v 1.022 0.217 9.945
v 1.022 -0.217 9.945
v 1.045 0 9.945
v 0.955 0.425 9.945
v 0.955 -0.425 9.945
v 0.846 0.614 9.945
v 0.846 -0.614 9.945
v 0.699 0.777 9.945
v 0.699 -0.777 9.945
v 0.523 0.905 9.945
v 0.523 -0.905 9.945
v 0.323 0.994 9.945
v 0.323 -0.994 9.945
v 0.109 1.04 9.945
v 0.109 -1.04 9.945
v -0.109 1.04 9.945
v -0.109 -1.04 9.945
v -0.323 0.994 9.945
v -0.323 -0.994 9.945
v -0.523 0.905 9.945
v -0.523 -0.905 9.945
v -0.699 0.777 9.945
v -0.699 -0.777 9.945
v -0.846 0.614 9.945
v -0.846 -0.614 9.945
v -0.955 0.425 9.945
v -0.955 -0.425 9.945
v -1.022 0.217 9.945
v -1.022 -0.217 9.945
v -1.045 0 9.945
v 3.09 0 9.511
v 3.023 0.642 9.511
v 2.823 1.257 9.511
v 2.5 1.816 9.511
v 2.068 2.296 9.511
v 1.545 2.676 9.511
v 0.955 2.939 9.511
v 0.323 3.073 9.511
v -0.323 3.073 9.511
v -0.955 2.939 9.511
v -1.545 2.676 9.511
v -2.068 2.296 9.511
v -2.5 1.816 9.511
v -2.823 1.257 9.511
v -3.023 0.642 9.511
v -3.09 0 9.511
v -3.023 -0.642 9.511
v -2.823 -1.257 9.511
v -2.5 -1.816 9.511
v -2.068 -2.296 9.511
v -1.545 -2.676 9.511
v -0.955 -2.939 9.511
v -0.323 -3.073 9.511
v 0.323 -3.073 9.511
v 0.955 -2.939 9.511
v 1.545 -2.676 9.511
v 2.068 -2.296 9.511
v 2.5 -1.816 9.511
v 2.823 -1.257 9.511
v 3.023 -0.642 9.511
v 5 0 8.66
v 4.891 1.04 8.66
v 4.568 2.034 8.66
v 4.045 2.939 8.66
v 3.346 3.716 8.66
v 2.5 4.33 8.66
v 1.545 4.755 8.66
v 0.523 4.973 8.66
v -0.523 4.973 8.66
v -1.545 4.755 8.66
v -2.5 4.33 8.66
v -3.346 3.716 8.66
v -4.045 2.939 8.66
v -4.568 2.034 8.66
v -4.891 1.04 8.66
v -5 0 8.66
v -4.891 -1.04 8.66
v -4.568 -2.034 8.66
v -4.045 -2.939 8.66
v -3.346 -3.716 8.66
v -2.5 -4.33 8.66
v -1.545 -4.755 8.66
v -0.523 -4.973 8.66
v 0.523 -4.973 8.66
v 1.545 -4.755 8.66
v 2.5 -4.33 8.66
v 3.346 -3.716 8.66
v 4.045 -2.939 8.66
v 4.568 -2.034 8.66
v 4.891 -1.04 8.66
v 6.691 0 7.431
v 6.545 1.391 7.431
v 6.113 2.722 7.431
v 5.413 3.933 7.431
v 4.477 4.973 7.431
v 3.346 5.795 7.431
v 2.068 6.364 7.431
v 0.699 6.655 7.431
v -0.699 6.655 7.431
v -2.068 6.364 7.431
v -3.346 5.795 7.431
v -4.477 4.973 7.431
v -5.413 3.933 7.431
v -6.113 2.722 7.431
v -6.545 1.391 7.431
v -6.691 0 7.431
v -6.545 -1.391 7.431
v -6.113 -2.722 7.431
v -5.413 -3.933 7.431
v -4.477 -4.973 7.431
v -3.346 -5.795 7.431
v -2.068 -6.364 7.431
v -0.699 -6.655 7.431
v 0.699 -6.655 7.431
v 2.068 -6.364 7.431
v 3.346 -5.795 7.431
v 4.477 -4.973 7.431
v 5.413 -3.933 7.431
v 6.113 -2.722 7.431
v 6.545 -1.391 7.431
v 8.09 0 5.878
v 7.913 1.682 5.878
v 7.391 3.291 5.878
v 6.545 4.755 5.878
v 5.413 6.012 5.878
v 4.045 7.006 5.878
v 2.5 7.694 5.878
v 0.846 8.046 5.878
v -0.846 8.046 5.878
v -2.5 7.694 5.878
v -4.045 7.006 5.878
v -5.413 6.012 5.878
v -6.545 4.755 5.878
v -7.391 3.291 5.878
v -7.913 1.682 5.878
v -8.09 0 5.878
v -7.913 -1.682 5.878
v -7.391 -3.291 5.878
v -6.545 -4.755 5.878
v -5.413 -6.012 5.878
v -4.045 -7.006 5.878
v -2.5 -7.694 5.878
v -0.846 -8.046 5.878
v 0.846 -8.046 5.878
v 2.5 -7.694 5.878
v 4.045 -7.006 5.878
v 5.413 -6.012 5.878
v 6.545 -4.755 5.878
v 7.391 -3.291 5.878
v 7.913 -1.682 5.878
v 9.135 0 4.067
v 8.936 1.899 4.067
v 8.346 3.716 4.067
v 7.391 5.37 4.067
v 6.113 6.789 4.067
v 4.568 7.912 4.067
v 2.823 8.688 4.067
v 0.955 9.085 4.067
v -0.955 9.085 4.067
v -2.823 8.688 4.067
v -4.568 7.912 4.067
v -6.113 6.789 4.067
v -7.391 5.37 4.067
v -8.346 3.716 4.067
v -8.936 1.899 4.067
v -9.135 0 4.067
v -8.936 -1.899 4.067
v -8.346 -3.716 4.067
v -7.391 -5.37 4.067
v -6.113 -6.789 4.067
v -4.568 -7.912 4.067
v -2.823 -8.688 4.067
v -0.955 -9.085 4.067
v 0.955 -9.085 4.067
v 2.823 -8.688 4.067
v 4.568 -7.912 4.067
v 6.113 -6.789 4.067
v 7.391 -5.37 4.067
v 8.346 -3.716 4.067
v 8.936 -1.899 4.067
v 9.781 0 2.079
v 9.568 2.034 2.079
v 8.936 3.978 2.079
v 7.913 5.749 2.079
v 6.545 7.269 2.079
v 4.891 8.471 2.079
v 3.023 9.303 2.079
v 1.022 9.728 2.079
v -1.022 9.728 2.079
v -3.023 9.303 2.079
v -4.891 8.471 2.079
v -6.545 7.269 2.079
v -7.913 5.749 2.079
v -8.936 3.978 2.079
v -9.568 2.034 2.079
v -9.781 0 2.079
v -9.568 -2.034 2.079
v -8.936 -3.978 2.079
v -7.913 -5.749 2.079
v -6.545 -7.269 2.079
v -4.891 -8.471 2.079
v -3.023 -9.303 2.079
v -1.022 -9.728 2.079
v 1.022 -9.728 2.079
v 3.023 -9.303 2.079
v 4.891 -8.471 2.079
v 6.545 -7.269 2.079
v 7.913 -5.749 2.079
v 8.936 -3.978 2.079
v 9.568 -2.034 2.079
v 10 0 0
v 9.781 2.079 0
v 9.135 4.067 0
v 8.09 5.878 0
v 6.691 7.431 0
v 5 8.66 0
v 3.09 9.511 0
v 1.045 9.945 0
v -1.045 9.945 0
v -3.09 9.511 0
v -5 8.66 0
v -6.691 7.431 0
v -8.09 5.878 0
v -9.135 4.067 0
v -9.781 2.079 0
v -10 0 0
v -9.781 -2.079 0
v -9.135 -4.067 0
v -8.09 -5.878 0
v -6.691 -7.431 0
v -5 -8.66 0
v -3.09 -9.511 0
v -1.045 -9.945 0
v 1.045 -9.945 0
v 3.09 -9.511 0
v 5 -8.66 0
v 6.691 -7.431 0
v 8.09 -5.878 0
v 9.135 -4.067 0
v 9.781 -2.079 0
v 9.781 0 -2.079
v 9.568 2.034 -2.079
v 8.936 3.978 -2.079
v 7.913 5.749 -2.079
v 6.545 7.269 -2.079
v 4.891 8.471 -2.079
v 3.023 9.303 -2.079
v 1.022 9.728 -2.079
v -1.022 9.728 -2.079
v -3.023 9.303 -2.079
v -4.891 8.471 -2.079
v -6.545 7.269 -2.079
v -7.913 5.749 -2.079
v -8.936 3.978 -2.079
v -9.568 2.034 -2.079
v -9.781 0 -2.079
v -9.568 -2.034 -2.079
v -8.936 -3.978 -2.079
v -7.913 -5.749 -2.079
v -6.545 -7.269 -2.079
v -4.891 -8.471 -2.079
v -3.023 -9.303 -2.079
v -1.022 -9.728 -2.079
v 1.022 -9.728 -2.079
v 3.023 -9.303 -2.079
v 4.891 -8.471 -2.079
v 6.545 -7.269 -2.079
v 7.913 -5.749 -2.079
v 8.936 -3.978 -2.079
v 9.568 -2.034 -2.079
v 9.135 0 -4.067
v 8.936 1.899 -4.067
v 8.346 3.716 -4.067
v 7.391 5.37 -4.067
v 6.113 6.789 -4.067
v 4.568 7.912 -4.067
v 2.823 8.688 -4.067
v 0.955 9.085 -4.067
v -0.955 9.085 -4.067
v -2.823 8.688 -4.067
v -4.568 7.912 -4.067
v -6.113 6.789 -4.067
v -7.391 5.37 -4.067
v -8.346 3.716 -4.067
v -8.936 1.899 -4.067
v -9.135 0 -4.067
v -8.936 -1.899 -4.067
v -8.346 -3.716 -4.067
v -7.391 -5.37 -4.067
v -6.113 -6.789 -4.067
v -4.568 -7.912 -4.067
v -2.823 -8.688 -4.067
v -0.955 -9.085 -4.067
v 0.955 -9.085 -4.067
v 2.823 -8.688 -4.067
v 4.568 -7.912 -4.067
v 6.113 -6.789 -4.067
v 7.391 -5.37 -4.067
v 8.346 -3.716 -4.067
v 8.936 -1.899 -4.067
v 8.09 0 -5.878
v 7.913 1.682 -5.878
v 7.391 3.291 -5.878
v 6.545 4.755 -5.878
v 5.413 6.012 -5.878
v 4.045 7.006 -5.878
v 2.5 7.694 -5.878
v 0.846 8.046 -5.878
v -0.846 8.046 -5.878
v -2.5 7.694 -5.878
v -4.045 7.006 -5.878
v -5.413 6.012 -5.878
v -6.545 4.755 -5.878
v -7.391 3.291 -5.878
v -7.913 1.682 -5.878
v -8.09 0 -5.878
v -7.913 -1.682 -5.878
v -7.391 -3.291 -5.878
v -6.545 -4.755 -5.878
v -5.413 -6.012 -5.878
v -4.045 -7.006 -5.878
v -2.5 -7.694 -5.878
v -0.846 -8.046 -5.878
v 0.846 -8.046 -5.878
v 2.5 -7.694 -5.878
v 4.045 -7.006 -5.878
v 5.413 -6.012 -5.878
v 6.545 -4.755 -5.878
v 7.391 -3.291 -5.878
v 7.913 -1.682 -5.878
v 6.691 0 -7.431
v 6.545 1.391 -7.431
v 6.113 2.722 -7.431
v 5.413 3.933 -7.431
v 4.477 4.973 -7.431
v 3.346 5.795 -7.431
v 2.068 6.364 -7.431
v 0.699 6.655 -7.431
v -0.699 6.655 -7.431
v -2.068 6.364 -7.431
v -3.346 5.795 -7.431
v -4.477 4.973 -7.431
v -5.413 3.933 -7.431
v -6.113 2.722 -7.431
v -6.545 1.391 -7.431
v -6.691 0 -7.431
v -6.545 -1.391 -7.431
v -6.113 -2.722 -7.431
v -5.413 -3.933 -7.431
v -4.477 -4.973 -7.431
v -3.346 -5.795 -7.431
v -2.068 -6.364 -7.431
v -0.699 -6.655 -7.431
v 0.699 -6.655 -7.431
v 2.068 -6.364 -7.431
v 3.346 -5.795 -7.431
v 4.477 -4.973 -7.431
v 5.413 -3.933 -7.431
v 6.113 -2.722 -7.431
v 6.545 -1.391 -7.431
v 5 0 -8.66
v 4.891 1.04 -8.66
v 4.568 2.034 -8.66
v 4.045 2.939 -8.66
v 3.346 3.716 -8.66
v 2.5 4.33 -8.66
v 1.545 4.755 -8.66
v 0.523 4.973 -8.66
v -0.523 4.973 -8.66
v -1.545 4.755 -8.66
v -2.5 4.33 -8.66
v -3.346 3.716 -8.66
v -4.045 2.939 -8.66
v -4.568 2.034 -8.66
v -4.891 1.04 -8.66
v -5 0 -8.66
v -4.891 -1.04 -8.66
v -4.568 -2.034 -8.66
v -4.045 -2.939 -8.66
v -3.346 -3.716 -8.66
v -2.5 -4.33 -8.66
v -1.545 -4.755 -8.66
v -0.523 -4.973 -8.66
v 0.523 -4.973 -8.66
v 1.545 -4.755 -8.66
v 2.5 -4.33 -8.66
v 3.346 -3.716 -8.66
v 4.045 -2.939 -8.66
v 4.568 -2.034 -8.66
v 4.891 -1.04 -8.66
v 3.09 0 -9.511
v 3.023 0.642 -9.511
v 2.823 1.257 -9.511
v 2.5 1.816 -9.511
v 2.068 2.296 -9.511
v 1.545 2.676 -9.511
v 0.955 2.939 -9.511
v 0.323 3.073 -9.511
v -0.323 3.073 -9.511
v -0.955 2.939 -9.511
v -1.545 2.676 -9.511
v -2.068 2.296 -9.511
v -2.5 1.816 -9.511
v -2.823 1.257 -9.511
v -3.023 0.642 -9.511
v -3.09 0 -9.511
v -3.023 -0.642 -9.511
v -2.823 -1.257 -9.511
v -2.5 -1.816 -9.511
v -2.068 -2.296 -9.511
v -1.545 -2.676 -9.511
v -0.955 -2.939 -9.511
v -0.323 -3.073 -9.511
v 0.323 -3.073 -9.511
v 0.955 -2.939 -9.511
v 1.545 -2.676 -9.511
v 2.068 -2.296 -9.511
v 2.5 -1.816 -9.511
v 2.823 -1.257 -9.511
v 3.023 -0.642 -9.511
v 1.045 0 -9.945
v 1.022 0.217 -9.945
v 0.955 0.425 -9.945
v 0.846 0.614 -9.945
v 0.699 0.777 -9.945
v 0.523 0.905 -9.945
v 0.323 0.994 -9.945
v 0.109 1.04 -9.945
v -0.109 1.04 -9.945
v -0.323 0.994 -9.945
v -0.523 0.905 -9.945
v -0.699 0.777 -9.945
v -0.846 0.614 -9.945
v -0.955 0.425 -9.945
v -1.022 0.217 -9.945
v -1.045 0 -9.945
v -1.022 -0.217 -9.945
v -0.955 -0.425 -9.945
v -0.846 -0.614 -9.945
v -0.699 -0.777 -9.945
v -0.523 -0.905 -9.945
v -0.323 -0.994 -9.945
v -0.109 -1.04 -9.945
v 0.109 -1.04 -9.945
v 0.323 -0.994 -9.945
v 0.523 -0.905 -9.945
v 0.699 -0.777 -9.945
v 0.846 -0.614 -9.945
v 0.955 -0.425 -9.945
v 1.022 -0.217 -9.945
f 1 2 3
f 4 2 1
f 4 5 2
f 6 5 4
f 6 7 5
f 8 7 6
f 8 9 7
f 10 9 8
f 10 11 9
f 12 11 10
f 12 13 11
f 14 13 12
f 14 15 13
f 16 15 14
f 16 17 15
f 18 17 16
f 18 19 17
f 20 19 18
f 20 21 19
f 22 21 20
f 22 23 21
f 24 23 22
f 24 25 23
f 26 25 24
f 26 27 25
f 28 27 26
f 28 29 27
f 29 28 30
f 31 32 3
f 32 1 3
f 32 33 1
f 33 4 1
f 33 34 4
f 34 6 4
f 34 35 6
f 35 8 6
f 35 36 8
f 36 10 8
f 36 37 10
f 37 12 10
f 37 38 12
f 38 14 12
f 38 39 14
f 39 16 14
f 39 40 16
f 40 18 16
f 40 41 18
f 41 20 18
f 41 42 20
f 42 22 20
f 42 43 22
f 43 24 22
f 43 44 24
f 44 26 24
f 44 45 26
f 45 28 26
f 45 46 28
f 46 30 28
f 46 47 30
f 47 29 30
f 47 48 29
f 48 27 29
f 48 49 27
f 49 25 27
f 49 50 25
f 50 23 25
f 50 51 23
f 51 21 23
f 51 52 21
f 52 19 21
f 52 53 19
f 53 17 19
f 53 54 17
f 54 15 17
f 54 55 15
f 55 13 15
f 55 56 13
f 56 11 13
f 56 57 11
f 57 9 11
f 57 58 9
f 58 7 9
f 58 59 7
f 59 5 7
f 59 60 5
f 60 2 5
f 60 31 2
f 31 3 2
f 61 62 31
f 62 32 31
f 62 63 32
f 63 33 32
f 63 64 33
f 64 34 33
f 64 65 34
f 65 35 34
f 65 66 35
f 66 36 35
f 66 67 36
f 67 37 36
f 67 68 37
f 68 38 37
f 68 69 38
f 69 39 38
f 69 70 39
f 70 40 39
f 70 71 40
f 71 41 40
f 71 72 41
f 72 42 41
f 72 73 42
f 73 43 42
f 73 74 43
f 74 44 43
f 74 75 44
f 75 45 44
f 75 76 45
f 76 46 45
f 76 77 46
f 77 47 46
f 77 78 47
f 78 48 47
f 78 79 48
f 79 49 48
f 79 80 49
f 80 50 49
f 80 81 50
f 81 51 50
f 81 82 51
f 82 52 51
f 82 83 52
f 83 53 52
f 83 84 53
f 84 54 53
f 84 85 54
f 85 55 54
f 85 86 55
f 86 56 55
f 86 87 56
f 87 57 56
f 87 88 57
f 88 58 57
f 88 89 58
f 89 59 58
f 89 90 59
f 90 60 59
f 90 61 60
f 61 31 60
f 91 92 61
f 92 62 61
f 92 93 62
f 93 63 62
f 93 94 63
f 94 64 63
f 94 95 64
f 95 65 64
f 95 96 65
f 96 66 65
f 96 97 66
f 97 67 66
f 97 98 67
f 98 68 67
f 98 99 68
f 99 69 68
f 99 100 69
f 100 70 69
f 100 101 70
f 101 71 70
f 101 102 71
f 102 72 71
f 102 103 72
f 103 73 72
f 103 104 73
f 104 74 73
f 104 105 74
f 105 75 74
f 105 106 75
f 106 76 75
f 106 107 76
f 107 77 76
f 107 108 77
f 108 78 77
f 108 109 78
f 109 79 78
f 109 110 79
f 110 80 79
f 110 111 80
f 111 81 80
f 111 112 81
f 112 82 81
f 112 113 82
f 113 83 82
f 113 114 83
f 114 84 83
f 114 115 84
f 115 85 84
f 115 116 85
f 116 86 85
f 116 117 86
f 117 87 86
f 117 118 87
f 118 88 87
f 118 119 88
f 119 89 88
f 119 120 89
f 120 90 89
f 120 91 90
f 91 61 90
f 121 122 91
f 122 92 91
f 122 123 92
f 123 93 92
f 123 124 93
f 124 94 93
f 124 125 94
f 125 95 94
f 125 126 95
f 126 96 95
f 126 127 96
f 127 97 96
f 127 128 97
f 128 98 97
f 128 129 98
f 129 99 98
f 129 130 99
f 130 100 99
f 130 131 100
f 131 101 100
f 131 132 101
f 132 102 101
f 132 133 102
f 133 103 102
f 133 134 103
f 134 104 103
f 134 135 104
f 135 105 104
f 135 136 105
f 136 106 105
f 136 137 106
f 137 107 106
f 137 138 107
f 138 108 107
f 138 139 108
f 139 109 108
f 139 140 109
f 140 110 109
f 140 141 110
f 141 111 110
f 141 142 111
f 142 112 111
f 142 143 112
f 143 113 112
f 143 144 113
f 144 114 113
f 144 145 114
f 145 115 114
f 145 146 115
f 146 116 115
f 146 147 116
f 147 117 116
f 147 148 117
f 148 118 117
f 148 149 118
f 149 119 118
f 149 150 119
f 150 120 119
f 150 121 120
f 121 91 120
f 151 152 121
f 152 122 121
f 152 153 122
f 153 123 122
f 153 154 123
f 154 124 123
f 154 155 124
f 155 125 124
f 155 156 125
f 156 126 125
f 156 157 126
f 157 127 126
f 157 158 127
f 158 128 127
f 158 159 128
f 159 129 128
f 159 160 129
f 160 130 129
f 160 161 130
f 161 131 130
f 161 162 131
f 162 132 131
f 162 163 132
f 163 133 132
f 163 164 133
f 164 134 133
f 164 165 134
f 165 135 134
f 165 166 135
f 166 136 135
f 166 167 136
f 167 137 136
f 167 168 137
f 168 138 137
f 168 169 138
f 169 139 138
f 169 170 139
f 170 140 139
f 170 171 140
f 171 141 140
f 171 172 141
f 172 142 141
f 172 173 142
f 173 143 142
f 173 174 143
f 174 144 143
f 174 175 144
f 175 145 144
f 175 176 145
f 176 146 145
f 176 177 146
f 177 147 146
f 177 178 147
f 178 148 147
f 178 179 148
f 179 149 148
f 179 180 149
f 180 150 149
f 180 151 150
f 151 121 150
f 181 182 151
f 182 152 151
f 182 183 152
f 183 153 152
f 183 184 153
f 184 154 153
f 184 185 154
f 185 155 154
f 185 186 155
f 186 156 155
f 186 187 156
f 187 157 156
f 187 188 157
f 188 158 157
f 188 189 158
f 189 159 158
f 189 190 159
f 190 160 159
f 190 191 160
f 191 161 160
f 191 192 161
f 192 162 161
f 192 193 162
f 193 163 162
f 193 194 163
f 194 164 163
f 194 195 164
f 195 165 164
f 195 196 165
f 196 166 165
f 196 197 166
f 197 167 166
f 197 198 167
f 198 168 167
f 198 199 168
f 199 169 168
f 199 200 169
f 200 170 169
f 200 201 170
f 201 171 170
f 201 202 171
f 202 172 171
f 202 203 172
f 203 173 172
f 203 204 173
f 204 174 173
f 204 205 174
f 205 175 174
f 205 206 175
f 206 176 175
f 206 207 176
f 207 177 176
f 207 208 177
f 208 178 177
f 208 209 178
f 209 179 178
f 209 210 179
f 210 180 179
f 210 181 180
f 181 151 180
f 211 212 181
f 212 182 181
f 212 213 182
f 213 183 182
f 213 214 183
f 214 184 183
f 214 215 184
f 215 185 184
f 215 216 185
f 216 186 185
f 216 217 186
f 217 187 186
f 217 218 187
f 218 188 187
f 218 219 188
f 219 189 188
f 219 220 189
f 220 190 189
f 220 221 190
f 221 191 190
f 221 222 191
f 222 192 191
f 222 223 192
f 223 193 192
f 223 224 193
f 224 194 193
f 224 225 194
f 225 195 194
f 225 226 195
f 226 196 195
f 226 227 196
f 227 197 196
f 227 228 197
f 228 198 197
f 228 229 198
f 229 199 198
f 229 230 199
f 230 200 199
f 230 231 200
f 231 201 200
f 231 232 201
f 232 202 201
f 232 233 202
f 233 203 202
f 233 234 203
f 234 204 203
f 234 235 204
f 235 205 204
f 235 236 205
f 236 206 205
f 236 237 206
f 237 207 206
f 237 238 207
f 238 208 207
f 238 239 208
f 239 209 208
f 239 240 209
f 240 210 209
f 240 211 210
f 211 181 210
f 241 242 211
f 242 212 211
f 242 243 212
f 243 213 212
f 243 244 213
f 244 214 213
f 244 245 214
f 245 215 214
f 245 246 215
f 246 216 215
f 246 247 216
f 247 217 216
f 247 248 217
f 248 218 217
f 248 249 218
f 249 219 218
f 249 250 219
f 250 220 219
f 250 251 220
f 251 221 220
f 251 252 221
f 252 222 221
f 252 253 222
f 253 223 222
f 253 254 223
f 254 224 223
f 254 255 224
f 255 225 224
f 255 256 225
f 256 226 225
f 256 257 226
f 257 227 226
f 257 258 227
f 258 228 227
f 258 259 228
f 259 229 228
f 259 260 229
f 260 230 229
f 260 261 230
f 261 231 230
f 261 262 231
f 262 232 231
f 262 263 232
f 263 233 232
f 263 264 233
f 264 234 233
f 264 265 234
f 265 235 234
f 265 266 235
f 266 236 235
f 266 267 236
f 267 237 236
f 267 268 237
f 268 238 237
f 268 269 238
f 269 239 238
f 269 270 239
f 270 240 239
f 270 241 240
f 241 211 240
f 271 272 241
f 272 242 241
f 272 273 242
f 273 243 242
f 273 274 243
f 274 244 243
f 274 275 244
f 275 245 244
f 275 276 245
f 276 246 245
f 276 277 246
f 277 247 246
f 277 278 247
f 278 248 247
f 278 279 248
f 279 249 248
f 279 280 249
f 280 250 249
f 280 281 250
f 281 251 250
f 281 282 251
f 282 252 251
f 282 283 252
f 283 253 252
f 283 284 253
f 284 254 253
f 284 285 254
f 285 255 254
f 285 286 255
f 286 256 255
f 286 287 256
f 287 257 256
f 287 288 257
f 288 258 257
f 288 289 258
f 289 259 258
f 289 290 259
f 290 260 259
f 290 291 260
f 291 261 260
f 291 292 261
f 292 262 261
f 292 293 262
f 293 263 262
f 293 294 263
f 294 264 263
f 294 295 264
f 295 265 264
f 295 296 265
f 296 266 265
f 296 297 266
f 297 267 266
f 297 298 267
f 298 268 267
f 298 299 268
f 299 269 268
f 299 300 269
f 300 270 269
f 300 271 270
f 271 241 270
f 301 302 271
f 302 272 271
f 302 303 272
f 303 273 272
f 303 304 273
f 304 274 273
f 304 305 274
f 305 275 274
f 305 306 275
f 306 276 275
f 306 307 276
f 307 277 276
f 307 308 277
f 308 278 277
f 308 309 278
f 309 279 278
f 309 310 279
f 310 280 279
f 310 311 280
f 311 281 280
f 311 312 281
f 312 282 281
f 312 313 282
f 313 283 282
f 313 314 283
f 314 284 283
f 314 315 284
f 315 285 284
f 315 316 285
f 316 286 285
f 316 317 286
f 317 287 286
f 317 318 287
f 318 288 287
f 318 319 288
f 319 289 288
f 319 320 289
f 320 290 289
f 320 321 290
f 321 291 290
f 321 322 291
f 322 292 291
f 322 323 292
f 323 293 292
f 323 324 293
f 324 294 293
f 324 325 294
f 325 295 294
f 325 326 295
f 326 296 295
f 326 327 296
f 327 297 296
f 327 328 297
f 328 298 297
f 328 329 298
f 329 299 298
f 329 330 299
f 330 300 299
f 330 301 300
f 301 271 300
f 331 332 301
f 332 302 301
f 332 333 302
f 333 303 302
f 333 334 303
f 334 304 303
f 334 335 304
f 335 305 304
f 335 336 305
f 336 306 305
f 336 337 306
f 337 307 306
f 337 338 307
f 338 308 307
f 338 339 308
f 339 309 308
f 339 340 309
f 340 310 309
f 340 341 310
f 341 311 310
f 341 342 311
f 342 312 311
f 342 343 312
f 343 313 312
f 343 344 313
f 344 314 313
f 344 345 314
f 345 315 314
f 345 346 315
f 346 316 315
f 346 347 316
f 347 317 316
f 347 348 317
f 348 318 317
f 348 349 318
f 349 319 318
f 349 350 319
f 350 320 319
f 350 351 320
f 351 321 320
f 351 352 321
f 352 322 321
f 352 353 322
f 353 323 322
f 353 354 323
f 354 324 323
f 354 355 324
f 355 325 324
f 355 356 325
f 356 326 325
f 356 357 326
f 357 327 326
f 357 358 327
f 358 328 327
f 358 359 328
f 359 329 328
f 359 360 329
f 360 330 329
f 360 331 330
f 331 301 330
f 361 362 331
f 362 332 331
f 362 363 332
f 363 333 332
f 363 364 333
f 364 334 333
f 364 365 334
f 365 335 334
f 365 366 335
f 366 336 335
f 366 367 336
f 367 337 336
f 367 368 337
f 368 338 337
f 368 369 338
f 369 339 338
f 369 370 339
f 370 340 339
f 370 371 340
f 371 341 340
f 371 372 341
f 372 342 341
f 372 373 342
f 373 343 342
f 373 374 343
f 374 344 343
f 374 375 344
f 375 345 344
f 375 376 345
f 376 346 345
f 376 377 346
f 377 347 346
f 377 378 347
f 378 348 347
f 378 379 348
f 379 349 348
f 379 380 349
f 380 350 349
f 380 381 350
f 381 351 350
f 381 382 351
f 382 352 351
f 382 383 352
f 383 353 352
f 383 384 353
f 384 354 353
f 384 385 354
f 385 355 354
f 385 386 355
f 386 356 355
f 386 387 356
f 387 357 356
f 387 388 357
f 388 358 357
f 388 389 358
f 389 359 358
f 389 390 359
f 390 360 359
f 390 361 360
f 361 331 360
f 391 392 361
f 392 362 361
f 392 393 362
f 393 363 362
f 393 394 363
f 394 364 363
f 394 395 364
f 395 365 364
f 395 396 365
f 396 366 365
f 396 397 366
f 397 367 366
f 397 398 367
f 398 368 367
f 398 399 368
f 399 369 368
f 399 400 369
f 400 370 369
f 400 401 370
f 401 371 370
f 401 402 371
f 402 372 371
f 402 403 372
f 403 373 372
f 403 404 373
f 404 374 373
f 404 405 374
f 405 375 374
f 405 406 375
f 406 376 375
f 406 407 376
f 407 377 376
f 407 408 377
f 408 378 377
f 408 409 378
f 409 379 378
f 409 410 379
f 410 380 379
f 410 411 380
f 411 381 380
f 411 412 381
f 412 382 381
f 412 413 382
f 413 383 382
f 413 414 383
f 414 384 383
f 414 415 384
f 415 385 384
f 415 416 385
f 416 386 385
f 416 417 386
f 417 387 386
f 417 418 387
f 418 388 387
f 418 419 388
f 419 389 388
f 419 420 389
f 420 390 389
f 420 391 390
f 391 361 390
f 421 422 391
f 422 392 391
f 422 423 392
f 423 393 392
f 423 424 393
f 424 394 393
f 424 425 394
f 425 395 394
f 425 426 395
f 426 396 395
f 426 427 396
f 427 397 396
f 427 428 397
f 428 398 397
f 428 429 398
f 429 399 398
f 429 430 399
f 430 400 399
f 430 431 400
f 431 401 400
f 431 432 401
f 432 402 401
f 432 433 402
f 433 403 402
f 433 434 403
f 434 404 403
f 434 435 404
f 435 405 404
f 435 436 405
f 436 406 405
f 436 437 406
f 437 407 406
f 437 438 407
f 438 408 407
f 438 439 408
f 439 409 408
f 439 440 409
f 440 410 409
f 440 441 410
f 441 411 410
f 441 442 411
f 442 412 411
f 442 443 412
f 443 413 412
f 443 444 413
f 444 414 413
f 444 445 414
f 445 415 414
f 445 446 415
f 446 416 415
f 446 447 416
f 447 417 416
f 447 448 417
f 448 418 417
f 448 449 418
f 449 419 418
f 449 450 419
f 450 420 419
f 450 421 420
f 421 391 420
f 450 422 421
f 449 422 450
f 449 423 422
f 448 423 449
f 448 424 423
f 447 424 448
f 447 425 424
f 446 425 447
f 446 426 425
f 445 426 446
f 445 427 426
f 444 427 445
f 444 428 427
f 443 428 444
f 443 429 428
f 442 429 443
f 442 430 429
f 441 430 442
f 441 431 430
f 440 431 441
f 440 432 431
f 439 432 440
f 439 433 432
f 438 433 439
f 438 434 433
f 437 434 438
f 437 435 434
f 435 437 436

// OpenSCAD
// Unit of length: Unit.MM
color(c = [1.0, 0.0, 1.0, 1.0])
{
   sphere(r = 10.0);
}
